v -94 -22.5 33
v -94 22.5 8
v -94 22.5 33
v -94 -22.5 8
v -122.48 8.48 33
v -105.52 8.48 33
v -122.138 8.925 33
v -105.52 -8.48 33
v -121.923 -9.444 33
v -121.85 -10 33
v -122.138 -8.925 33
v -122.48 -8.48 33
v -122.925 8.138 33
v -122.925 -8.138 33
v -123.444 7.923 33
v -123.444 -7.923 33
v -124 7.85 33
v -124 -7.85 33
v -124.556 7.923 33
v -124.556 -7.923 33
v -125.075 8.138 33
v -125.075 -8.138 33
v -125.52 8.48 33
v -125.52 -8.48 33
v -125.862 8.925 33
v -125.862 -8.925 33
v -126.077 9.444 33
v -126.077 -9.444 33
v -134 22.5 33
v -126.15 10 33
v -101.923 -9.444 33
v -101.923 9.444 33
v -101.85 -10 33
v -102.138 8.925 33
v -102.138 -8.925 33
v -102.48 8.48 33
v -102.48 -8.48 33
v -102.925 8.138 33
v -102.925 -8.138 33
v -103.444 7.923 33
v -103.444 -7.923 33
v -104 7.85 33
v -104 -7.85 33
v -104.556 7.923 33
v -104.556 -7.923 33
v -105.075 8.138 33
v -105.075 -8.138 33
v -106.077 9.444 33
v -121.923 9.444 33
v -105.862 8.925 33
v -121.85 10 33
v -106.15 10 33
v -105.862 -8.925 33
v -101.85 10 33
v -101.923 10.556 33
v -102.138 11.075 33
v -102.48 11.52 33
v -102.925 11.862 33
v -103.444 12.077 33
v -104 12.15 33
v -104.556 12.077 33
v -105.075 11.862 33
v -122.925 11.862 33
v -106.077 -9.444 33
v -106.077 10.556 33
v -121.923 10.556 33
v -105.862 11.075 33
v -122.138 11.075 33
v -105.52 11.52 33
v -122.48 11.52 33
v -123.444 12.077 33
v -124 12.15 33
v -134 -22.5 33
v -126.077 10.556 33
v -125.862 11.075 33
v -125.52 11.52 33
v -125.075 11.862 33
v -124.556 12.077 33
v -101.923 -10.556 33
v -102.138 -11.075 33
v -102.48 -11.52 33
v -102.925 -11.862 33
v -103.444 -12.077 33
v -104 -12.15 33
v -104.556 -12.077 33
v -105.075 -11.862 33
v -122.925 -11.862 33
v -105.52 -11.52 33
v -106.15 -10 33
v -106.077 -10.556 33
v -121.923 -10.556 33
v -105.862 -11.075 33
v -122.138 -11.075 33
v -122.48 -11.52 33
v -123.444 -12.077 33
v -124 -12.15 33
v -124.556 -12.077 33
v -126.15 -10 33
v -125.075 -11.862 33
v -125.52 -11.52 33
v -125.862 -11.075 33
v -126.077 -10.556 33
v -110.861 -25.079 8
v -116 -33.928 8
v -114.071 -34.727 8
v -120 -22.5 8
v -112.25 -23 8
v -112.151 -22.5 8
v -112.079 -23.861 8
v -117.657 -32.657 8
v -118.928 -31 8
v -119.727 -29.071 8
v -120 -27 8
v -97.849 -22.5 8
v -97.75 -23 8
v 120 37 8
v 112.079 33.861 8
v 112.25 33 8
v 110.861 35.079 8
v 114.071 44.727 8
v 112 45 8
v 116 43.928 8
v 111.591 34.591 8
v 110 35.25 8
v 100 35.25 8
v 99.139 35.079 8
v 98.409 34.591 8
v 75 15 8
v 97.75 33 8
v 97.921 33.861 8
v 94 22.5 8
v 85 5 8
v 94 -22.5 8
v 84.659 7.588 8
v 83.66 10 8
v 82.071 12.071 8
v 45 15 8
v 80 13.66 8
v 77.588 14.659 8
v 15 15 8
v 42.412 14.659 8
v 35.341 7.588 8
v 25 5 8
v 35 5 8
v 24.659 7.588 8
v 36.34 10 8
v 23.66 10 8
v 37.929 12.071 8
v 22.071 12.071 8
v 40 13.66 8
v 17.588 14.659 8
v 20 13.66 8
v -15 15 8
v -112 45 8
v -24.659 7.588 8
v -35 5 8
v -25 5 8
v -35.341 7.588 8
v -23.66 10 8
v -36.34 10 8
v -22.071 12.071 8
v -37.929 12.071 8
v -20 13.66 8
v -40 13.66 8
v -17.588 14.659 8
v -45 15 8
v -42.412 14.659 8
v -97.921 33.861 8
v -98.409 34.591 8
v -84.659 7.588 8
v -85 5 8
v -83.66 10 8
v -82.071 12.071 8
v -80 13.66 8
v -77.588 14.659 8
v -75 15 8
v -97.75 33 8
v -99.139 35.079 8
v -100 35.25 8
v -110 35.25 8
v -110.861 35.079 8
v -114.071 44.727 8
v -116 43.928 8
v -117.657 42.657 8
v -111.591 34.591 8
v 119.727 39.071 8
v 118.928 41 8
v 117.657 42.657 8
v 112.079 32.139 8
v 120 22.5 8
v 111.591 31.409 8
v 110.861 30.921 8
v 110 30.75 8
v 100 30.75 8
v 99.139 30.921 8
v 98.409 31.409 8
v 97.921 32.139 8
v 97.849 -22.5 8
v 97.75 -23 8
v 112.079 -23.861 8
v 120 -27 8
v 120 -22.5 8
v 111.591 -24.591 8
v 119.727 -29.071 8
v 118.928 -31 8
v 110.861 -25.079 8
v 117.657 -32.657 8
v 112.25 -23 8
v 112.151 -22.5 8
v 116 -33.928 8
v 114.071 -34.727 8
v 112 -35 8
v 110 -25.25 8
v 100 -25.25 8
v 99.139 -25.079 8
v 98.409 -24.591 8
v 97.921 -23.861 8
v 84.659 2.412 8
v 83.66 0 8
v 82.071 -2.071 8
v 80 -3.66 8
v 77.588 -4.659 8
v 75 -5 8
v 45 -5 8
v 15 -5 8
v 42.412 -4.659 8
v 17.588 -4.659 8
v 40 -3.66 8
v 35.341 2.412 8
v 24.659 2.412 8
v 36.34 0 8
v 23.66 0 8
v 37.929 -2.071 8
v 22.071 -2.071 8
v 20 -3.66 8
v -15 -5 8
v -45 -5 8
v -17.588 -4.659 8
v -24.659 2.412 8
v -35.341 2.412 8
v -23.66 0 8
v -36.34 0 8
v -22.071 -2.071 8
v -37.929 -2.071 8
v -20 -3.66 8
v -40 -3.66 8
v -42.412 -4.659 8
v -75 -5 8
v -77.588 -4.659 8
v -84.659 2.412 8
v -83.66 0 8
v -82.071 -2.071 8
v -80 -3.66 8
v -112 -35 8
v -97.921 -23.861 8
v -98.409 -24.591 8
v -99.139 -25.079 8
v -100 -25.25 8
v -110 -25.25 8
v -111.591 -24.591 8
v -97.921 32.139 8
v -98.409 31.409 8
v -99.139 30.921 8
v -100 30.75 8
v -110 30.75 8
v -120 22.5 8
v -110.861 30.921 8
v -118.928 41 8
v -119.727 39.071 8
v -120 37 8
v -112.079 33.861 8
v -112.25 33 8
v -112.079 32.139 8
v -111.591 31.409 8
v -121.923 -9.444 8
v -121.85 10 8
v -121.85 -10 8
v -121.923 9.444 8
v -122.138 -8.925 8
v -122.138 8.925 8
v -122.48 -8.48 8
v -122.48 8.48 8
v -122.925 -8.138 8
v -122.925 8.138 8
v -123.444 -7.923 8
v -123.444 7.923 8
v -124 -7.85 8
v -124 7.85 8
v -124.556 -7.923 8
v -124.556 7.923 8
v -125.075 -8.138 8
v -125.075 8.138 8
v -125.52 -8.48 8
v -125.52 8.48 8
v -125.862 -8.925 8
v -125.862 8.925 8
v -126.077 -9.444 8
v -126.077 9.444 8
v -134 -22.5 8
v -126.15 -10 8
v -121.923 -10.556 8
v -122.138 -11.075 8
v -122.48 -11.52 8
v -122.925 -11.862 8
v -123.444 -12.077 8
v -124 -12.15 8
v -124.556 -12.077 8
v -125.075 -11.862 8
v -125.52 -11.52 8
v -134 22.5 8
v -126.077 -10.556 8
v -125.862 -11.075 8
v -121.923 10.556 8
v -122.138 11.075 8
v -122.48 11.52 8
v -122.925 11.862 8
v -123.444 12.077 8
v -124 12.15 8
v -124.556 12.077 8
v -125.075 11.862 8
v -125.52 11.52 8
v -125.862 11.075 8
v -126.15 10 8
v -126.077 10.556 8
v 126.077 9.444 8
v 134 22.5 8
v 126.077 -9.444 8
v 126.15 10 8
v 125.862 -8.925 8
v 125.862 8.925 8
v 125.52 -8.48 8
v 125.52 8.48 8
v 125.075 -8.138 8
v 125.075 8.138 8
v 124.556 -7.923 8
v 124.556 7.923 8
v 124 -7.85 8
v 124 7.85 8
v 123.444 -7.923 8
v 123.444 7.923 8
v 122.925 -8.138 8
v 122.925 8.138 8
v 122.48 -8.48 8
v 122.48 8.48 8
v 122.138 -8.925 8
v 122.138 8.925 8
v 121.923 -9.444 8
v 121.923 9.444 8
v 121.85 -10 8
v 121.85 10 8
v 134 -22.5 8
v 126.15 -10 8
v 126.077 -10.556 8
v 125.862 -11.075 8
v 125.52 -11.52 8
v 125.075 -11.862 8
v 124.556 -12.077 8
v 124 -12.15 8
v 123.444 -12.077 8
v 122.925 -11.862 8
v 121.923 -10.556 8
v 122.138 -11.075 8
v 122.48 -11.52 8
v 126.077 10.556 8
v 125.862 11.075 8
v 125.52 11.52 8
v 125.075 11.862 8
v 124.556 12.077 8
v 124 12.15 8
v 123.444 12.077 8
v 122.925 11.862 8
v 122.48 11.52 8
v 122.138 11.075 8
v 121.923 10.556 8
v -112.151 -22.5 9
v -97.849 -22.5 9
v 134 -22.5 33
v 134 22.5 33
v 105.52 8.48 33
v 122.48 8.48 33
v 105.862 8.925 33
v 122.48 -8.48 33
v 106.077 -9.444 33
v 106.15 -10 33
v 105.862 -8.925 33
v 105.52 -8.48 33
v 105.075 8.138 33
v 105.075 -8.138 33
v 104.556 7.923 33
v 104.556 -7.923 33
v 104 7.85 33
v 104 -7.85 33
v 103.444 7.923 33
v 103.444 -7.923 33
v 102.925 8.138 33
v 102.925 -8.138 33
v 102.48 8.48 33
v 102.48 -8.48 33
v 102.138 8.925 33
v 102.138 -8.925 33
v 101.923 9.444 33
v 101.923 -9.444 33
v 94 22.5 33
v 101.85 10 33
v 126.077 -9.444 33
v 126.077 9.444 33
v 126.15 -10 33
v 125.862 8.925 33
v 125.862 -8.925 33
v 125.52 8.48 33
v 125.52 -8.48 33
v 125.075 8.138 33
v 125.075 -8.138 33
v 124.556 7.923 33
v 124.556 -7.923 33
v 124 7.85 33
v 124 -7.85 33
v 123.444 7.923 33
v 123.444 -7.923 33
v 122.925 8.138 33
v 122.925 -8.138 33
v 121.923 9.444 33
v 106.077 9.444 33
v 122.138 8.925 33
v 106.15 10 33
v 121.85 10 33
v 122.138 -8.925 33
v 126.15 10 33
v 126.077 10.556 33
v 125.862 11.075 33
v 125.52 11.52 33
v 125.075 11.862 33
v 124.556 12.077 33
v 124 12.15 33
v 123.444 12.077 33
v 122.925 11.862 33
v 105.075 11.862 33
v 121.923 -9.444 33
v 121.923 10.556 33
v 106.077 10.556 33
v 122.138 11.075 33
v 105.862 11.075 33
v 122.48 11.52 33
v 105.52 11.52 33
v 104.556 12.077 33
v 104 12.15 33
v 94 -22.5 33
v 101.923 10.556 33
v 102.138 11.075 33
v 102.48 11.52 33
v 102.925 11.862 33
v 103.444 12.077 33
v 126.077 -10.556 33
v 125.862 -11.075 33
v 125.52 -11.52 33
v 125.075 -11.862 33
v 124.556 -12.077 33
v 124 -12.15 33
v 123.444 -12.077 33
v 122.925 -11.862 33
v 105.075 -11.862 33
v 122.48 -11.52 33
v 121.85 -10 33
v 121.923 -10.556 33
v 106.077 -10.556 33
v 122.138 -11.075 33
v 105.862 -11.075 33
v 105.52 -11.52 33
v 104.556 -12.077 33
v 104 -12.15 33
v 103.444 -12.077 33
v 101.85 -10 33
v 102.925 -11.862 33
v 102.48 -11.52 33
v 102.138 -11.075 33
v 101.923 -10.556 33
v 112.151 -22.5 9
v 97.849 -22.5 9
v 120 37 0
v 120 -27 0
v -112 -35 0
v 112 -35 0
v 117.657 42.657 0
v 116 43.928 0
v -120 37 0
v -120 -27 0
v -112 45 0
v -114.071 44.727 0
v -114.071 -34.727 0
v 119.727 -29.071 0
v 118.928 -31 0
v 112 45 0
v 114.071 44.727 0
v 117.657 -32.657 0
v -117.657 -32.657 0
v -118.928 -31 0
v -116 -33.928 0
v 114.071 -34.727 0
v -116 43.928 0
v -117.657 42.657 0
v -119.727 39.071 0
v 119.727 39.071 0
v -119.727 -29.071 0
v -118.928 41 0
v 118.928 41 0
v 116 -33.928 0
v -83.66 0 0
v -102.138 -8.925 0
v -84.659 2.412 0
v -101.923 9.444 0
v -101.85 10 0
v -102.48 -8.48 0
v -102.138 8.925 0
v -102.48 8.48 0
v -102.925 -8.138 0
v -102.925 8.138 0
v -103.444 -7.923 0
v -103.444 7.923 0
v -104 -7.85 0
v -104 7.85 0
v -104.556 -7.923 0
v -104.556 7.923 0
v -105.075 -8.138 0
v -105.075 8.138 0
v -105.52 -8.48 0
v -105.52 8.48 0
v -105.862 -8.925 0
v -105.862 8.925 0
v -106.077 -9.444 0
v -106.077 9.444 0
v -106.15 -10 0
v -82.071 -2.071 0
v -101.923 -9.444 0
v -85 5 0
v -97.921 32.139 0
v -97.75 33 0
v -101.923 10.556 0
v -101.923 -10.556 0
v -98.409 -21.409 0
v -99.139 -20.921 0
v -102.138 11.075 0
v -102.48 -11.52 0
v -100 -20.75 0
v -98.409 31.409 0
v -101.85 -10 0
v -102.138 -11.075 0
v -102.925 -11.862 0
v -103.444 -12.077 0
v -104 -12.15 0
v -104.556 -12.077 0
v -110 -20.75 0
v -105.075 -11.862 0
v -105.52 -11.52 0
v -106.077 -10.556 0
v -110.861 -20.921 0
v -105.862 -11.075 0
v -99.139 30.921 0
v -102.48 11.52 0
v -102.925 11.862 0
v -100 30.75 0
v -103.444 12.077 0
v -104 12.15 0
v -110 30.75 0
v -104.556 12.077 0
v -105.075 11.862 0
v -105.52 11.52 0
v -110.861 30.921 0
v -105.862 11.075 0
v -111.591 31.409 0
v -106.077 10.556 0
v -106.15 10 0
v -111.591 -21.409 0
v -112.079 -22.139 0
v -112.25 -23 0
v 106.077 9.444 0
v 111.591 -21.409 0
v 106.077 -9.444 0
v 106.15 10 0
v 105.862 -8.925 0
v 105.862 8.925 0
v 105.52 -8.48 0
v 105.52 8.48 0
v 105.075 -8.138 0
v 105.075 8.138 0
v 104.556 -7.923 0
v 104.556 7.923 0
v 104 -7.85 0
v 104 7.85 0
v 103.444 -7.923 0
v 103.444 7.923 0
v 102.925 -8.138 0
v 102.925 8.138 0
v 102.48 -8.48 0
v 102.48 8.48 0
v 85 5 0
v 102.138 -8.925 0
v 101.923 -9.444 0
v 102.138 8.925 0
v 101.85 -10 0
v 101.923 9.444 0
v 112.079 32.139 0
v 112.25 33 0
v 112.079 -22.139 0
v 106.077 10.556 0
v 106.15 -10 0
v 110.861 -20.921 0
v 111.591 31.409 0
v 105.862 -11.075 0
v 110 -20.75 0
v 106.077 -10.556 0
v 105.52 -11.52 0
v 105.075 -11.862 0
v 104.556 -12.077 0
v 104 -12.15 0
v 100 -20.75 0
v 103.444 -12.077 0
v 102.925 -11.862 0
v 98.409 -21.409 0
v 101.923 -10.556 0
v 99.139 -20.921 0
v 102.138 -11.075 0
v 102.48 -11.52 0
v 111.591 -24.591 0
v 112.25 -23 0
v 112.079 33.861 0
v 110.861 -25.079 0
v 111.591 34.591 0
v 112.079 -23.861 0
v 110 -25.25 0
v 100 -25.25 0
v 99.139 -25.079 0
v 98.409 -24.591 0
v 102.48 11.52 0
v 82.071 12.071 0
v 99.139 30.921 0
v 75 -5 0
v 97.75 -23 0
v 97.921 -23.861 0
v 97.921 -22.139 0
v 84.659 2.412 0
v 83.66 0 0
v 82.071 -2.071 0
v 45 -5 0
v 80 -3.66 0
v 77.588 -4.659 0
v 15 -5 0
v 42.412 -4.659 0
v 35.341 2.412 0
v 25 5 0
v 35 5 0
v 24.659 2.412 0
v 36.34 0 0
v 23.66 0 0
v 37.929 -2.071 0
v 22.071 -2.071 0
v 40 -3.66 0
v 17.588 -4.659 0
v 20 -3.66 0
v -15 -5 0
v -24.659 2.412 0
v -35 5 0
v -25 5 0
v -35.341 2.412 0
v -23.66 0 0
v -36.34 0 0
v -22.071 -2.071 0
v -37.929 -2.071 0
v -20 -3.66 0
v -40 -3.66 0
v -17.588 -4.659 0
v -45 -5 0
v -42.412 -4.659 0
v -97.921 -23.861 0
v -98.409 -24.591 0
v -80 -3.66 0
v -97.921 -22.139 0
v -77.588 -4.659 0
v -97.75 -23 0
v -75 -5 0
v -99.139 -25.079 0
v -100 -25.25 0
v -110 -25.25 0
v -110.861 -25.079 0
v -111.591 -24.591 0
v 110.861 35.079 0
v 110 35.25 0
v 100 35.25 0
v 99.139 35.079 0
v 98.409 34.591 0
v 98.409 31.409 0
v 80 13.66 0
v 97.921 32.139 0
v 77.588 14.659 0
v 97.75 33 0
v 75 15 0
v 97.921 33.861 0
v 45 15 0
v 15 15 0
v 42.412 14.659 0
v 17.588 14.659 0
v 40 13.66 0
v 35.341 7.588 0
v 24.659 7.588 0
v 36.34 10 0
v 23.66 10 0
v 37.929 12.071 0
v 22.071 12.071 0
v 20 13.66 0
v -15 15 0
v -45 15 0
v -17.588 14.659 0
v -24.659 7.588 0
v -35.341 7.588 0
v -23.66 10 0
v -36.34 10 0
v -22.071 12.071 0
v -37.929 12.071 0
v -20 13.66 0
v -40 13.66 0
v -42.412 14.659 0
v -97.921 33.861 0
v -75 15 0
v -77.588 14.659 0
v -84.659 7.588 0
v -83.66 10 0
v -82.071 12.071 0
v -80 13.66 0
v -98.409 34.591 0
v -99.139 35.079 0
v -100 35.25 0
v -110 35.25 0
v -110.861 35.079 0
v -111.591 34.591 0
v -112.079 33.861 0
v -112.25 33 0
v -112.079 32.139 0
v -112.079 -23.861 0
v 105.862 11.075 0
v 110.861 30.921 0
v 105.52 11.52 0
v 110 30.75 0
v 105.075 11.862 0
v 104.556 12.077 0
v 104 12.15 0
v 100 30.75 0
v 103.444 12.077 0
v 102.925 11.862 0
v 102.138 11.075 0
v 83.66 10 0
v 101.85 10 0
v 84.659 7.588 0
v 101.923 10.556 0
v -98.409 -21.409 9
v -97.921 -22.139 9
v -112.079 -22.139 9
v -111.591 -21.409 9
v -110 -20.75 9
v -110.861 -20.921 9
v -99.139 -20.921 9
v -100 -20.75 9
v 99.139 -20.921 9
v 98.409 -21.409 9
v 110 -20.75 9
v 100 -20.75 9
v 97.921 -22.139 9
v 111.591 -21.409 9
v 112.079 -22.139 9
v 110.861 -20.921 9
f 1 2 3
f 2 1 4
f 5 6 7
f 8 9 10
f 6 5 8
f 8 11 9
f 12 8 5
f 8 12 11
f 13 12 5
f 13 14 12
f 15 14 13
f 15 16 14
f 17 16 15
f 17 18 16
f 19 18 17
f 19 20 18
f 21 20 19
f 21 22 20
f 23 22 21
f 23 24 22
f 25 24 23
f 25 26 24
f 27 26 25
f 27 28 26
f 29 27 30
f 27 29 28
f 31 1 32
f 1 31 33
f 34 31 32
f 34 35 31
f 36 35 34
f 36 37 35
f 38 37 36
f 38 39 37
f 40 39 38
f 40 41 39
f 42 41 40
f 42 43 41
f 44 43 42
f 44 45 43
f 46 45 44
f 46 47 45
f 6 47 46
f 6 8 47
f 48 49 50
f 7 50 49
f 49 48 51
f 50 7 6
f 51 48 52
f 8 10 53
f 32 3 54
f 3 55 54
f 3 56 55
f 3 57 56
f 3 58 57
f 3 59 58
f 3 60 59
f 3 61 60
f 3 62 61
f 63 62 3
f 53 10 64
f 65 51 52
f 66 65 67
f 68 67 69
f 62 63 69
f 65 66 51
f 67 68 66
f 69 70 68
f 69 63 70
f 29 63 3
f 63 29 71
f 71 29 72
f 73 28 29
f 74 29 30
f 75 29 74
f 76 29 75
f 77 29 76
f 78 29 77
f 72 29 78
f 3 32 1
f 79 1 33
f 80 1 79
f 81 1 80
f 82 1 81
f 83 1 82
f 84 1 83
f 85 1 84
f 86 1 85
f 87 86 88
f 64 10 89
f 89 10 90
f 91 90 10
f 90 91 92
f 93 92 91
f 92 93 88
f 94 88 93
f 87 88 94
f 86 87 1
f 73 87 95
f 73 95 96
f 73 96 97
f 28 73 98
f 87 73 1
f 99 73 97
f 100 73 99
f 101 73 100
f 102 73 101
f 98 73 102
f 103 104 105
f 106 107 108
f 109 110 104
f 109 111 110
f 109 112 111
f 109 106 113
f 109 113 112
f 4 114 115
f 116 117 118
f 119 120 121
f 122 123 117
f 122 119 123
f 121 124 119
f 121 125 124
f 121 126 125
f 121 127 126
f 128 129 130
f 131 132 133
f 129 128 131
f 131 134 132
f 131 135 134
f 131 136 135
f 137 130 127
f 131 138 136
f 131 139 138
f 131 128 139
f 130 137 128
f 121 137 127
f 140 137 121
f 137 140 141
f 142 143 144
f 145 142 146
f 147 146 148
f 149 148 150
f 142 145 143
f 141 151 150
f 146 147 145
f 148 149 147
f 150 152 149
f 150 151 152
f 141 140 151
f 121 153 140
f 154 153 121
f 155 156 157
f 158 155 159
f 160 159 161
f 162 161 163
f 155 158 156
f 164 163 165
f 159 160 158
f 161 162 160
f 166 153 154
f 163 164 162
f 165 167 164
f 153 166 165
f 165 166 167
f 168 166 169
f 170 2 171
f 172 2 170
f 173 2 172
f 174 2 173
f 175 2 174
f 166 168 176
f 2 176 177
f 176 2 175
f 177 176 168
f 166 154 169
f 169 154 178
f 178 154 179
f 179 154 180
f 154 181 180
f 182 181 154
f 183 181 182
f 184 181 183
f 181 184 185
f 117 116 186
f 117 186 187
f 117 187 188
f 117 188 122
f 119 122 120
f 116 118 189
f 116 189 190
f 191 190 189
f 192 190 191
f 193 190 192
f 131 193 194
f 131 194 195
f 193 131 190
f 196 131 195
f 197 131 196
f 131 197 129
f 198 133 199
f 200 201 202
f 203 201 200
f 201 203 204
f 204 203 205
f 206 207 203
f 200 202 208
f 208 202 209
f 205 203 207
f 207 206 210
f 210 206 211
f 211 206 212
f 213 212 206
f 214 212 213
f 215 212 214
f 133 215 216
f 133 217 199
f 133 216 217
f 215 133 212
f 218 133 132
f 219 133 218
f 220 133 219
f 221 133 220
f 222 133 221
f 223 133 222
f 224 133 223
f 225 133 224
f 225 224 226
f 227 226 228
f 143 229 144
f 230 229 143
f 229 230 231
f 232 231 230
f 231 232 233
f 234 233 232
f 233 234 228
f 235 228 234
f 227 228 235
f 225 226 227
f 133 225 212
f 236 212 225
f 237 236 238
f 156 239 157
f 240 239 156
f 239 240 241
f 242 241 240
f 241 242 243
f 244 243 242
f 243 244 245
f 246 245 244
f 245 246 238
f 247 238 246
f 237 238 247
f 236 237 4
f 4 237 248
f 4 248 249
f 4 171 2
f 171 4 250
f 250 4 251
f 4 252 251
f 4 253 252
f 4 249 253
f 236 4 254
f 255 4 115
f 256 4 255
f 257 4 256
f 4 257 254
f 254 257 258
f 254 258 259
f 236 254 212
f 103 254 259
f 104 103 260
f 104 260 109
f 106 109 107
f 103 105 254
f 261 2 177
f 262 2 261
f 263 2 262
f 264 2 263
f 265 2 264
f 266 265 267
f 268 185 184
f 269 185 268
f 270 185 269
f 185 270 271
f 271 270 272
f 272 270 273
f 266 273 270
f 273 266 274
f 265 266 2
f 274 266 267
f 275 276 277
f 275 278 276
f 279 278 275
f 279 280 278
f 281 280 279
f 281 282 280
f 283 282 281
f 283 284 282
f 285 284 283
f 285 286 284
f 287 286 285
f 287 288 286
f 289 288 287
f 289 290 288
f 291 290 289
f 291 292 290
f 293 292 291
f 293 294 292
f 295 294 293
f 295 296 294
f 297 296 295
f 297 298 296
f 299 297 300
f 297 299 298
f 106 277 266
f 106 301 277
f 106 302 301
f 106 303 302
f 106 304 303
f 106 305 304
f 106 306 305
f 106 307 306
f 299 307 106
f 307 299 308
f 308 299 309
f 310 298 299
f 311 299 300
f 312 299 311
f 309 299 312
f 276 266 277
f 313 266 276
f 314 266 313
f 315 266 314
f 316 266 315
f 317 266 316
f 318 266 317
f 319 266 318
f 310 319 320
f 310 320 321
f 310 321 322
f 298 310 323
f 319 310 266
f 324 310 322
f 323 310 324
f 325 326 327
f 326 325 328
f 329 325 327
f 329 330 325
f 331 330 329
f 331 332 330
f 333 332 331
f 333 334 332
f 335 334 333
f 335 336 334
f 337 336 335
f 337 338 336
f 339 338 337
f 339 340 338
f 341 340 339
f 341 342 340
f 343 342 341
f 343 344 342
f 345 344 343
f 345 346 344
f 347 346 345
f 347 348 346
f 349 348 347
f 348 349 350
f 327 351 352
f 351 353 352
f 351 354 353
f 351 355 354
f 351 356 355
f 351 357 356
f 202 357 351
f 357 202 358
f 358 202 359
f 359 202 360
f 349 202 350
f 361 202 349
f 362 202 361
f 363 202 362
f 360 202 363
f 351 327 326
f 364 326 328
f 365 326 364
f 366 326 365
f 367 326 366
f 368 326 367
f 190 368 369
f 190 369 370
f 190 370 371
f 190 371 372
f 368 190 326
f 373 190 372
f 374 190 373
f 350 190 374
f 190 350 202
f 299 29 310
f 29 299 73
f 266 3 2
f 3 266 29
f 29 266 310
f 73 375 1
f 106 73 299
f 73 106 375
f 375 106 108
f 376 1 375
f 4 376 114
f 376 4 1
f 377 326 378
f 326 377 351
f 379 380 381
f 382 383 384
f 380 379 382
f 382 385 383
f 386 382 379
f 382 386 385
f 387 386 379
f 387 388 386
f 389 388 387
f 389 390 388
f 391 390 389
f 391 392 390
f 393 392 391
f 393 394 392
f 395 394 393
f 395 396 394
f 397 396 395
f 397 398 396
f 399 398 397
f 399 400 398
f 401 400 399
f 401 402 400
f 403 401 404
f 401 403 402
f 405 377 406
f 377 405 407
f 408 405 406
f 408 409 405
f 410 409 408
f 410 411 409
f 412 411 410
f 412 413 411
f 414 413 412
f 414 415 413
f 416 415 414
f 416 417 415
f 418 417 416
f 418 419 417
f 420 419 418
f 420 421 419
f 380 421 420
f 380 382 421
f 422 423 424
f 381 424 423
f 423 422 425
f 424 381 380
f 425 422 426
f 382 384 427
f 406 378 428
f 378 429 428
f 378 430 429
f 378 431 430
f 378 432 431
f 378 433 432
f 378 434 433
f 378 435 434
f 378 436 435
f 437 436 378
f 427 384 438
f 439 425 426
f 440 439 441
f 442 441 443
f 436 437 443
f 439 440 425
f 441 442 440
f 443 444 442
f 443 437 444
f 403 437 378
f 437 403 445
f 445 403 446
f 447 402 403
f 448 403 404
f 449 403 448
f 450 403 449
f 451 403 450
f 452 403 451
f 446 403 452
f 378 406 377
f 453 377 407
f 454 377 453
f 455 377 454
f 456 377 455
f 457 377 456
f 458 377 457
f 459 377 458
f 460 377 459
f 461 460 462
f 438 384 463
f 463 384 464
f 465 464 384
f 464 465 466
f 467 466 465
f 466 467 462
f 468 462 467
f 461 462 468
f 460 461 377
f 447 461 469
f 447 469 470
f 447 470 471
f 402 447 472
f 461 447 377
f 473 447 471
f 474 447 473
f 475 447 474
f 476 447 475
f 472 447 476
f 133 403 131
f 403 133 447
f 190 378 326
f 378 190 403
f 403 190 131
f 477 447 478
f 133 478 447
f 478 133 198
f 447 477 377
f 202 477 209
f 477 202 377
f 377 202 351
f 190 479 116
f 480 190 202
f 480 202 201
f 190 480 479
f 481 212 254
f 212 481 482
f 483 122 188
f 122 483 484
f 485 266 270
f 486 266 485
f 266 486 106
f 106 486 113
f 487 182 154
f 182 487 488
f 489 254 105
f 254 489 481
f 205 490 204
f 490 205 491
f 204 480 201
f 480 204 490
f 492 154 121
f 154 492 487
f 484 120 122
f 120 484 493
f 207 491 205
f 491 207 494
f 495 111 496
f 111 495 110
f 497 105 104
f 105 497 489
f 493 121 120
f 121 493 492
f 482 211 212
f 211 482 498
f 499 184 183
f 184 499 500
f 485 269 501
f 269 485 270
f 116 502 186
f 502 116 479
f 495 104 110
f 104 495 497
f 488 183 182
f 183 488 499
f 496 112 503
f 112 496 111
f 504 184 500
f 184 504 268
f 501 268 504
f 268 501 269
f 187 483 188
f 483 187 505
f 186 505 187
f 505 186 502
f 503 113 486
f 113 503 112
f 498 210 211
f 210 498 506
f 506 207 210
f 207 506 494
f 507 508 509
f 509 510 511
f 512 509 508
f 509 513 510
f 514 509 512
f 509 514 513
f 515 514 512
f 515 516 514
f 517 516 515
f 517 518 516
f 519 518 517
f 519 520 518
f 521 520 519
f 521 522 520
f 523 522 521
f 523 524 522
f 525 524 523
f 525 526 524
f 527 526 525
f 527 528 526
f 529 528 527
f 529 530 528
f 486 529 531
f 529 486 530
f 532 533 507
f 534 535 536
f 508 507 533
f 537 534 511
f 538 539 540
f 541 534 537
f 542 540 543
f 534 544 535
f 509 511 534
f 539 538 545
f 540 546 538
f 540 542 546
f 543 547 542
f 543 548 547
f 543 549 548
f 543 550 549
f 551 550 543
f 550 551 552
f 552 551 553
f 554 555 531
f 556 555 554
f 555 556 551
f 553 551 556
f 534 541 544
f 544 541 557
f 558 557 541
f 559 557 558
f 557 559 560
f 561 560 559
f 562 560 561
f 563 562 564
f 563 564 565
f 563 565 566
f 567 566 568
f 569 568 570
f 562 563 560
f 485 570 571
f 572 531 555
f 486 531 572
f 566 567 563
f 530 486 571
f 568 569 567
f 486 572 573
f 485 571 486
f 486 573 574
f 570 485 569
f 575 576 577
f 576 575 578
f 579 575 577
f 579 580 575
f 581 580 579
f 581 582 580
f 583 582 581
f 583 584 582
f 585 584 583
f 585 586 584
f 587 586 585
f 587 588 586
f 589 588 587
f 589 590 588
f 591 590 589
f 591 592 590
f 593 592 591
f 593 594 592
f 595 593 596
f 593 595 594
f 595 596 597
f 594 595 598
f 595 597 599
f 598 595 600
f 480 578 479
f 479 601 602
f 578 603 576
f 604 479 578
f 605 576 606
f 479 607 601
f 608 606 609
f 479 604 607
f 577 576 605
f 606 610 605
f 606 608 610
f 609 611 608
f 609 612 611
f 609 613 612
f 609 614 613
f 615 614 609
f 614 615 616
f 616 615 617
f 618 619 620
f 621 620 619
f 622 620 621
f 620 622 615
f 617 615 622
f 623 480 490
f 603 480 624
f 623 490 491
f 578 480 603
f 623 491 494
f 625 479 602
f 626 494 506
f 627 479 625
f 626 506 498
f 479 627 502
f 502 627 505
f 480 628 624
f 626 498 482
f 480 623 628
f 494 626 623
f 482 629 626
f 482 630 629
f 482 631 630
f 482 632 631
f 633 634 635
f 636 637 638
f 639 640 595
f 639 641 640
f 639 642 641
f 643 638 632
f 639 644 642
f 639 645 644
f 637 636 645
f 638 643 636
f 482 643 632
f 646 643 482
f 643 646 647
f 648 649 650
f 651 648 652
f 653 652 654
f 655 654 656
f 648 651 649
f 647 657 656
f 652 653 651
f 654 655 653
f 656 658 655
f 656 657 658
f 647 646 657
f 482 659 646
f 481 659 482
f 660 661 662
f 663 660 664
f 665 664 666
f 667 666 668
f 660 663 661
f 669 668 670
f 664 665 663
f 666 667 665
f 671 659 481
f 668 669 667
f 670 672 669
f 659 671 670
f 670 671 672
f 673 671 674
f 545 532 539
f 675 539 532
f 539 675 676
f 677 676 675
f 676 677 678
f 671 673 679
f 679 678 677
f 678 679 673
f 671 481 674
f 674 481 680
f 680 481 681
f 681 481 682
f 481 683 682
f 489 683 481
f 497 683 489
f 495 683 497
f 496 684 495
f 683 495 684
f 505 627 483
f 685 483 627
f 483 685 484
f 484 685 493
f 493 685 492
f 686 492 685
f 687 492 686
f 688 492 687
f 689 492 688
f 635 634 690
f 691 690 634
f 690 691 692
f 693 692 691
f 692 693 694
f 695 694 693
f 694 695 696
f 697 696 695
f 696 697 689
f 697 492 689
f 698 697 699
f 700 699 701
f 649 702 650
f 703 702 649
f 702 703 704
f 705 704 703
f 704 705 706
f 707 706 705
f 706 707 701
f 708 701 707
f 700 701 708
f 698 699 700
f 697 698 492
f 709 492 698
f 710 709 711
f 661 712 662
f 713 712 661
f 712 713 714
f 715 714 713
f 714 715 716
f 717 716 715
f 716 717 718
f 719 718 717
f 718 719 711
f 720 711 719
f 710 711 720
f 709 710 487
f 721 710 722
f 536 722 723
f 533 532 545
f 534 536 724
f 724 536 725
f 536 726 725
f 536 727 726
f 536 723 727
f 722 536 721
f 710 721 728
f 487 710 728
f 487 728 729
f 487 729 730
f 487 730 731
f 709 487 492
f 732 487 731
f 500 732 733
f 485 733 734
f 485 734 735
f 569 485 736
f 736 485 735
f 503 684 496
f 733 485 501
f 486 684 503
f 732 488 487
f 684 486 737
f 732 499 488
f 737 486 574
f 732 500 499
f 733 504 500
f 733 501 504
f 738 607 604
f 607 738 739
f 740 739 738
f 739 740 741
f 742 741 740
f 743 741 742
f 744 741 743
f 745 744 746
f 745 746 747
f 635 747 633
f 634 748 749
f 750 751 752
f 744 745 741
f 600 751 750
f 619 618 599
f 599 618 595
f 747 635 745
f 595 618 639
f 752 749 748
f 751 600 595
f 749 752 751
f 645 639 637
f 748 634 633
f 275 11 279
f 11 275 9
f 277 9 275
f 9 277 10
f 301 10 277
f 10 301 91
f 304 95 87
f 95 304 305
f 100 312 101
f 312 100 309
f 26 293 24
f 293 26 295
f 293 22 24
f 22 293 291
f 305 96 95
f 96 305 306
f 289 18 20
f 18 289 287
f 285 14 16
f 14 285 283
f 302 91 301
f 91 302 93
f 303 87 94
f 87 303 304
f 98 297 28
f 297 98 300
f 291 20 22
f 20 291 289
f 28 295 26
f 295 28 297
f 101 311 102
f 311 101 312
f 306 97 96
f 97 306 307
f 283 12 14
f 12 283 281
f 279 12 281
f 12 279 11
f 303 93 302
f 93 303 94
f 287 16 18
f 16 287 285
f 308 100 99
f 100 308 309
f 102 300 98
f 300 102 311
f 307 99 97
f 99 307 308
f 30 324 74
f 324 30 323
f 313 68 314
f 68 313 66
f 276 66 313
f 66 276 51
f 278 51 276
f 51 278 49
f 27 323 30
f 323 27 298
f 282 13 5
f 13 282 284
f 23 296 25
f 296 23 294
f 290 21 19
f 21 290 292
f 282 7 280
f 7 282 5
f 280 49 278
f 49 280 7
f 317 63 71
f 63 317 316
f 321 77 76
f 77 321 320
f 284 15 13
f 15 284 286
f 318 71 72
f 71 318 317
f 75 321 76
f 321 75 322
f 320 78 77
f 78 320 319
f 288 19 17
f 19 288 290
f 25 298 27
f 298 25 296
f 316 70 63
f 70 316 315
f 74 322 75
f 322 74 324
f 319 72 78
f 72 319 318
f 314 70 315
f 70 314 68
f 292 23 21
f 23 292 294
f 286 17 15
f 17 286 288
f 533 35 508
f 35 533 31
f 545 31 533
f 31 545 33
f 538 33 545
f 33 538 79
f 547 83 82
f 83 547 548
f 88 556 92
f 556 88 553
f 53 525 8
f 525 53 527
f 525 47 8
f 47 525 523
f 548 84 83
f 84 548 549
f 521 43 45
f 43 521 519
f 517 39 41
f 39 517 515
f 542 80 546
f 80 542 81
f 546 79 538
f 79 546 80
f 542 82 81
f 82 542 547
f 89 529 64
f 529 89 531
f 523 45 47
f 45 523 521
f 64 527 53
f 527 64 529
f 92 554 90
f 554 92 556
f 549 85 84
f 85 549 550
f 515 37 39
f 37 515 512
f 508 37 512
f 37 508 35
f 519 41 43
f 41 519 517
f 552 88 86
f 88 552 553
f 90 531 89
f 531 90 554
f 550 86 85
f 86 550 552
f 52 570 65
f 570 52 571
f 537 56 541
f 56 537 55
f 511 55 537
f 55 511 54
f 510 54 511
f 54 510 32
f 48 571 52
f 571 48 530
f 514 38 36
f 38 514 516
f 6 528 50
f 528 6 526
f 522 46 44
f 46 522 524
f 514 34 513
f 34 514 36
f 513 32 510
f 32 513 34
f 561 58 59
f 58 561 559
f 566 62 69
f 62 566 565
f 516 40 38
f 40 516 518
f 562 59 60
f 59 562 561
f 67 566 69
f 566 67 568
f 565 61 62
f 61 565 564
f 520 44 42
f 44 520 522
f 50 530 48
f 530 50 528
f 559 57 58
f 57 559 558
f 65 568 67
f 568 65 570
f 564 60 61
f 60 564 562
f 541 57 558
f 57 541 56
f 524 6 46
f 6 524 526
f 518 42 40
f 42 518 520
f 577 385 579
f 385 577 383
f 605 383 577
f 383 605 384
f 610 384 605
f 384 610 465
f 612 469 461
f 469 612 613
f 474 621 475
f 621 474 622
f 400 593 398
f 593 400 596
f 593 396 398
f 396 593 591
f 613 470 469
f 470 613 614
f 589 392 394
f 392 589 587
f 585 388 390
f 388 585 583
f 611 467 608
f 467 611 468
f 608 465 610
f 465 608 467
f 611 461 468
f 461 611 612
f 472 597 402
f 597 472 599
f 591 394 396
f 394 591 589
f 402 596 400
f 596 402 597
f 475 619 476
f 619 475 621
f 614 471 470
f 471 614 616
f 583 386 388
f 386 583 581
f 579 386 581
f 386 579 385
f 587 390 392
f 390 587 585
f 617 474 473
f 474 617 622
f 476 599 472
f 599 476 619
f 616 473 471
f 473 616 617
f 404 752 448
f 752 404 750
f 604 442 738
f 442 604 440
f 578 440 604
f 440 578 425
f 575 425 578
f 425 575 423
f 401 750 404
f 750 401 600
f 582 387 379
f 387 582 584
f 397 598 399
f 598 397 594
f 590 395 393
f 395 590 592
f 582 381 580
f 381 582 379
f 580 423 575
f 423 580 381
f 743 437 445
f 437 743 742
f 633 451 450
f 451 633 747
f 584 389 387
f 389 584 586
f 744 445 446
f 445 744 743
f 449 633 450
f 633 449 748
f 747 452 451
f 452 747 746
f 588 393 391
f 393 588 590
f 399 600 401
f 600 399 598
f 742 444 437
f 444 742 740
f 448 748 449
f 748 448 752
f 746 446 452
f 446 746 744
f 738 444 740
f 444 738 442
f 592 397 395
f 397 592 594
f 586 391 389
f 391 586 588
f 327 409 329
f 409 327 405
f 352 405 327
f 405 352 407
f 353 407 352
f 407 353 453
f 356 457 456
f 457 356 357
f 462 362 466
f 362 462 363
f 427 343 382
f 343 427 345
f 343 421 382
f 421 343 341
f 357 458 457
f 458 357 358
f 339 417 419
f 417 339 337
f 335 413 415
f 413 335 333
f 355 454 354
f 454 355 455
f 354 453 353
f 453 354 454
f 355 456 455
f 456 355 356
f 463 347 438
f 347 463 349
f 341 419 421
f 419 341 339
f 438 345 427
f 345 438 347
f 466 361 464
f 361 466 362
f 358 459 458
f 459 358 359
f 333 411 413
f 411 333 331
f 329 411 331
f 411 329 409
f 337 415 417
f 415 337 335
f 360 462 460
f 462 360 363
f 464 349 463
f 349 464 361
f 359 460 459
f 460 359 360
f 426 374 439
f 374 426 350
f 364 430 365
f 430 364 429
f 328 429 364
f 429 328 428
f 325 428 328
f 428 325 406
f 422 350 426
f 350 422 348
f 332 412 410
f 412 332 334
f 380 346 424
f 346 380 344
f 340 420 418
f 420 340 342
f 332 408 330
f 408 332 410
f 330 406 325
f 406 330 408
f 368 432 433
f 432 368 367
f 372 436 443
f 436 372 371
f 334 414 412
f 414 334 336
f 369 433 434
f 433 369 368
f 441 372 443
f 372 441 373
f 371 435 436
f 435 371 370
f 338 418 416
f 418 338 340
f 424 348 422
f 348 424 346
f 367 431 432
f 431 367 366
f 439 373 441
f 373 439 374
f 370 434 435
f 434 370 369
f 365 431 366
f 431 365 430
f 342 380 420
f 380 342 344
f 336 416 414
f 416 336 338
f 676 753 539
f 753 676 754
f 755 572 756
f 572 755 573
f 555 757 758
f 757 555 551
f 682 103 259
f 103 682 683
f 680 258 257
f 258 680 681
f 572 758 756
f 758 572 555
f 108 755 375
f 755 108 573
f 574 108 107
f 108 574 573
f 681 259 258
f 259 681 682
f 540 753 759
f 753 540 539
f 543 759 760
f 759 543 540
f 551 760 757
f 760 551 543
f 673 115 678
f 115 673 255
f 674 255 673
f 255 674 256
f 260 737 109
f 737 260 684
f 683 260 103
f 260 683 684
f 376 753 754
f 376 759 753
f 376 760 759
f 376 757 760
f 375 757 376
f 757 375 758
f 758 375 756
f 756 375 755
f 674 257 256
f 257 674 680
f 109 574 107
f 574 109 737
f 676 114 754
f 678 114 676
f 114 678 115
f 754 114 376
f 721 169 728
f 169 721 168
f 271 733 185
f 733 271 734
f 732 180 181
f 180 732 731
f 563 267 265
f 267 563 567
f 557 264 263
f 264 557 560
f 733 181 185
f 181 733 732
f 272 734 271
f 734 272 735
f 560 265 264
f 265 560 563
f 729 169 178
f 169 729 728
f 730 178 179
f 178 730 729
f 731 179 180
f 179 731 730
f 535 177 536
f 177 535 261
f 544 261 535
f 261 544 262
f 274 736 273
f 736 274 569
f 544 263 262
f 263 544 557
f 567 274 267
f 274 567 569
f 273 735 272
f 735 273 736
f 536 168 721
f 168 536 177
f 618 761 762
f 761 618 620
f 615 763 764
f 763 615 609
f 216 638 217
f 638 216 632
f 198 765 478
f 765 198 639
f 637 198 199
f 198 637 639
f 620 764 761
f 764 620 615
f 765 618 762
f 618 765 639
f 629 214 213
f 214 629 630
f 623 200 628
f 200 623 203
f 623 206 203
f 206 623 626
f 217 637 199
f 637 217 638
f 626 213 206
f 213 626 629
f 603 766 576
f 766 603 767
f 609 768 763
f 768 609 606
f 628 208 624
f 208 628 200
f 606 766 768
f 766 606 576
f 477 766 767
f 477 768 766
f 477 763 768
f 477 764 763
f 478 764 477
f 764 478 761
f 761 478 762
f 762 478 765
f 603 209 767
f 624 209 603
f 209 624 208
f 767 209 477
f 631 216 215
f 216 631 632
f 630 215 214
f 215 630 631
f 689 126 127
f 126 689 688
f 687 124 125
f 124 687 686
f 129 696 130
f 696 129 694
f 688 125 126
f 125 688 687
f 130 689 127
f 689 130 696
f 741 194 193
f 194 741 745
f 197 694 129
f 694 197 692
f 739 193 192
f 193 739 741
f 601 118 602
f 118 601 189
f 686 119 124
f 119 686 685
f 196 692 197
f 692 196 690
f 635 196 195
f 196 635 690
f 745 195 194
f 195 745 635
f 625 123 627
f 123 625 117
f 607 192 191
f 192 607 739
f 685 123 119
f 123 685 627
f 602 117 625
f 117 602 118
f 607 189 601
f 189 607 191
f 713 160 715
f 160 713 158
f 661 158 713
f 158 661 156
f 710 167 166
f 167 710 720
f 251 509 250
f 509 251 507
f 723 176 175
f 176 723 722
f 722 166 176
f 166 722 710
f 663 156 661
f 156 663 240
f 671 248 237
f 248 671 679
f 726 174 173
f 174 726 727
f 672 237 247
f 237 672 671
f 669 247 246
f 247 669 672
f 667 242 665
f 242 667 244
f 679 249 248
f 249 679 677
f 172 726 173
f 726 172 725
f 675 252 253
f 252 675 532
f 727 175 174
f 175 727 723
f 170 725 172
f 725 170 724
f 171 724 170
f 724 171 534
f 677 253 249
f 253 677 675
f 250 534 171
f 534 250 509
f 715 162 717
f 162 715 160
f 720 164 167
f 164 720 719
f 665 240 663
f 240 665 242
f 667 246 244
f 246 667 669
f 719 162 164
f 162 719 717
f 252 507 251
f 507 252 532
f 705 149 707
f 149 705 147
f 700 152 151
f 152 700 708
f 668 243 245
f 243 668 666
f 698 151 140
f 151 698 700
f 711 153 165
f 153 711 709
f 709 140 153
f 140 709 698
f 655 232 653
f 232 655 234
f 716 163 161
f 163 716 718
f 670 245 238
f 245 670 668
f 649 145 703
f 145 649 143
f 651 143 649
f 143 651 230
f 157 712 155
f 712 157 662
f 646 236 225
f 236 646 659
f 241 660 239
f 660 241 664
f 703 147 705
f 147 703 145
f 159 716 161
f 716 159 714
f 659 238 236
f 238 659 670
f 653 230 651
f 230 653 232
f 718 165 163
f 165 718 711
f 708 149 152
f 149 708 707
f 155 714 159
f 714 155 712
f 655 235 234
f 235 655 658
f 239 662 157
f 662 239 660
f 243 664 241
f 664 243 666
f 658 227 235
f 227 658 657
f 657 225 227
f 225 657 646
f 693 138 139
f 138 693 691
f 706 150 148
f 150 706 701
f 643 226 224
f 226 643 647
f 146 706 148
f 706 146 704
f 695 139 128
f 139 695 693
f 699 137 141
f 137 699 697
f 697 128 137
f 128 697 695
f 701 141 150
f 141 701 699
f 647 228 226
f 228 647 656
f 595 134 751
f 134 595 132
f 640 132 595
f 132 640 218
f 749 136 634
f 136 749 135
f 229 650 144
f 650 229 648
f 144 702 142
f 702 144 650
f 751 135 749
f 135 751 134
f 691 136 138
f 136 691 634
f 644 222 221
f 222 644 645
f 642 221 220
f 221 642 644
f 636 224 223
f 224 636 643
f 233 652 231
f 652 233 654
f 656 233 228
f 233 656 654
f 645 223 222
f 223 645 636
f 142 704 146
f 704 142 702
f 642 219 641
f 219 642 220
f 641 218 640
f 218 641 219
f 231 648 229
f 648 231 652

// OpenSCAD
/*
 * BASE PLATE - Simple Structural Foundation
 *
 * FEATURES:
 * - Supports bearing blocks at ends
 * - Thin profile - no guidance grooves needed
 * - Slats self-align through overlap + cam contact
 * - End caps on cam prevent X drift
 *
 * Print: 1x
 * Orientation: Flat
 */

include <../common.scad>

$fn = 32;

// ============================================
// BASE DIMENSIONS (simplified)
// ============================================

// Thin base - just structural support
BASE_HEIGHT = 8;                          // Much thinner without T-slots

// Width in Y to support the wave area
BASE_Y_FRONT = LAYER_Y_OFFSET[0] - 20;    // ~-35mm
BASE_Y_BACK = LAYER_Y_OFFSET[NUM_LAYERS-1] + 30;  // ~+45mm (extra for bearing blocks)
BASE_TOTAL_DEPTH = BASE_Y_BACK - BASE_Y_FRONT;

// ============================================
// MAIN BASE PLATE MODULE
// ============================================

module base_plate() {
    difference() {
        union() {
            // Main plate body
            plate_body();

            // Bearing block support pedestals
            bearing_pedestals();
        }

        // Bearing block mounting holes
        bearing_block_holes();

        // Corner mounting slots
        corner_slots();

        // Weight reduction cutouts
        weight_reduction();
    }
}

// ============================================
// PLATE BODY
// ============================================

module plate_body() {
    // Simple rounded rectangle
    hull() {
        for (x = [-BASE_LENGTH/2 + 8, BASE_LENGTH/2 - 8]) {
            for (y = [BASE_Y_FRONT + 8, BASE_Y_BACK - 8]) {
                translate([x, y, 0])
                    cylinder(r = 8, h = BASE_HEIGHT, $fn = 24);
            }
        }
    }
}

// ============================================
// BEARING PEDESTALS
// ============================================

module bearing_pedestals() {
    // Raised blocks under bearing blocks
    pedestal_width = BB_WIDTH + 10;
    pedestal_depth = BB_DEPTH + 10;
    pedestal_height = BB_Z - BASE_HEIGHT;  // Height to reach BB_Z

    for (bb_x = [BB_LEFT_X, BB_RIGHT_X]) {
        translate([bb_x - pedestal_width/2, -pedestal_depth/2, BASE_HEIGHT])
            cube([pedestal_width, pedestal_depth, pedestal_height]);
    }
}

// ============================================
// BEARING BLOCK MOUNTING HOLES
// ============================================

module bearing_block_holes() {
    hole_spacing_x = 20;
    hole_spacing_y = 20;

    for (bb_x = [BB_LEFT_X, BB_RIGHT_X]) {
        for (dx = [-hole_spacing_x/2, hole_spacing_x/2]) {
            for (dy = [-hole_spacing_y/2, hole_spacing_y/2]) {
                translate([bb_x + dx, dy, -1])
                    cylinder(d = M4_HOLE, h = BASE_HEIGHT + BB_Z + 2, $fn = 24);
            }
        }
    }
}

// ============================================
// CORNER MOUNTING SLOTS
// ============================================

module corner_slots() {
    slot_length = 10;

    for (x_sign = [-1, 1]) {
        for (y_val = [BASE_Y_FRONT + 12, BASE_Y_BACK - 12]) {
            translate([x_sign * (BASE_LENGTH/2 - 20), y_val, -1])
            hull() {
                cylinder(d = 4.5, h = BASE_HEIGHT + 2, $fn = 16);
                translate([x_sign * slot_length, 0, 0])
                    cylinder(d = 4.5, h = BASE_HEIGHT + 2, $fn = 16);
            }
        }
    }
}

// ============================================
// WEIGHT REDUCTION
// ============================================

module weight_reduction() {
    // Oval cutouts in center area (away from pedestals)
    if (BASE_LENGTH > 150) {
        for (x = [-60, 0, 60]) {
            translate([x, (BASE_Y_FRONT + BASE_Y_BACK)/2, -1])
            hull() {
                translate([-15, 0, 0]) cylinder(d = 20, h = BASE_HEIGHT + 2, $fn = 24);
                translate([15, 0, 0]) cylinder(d = 20, h = BASE_HEIGHT + 2, $fn = 24);
            }
        }
    }
}

// ============================================
// RENDER
// ============================================

color(C_BASE)
base_plate();

// ============================================
// VERIFICATION
// ============================================

echo("=== BASE PLATE VERIFICATION (SIMPLIFIED) ===");
echo(str("Size: ", BASE_LENGTH, " x ", BASE_TOTAL_DEPTH, " x ", BASE_HEIGHT, "mm"));
echo(str("Y range: ", BASE_Y_FRONT, " to ", BASE_Y_BACK));
echo("");
echo("NOTE: No guidance grooves - slats self-align via:");
echo("  - Overlap between layers");
echo("  - Cam contact (followers ride on cam)");
echo("  - Cam end caps (prevent X drift)");
